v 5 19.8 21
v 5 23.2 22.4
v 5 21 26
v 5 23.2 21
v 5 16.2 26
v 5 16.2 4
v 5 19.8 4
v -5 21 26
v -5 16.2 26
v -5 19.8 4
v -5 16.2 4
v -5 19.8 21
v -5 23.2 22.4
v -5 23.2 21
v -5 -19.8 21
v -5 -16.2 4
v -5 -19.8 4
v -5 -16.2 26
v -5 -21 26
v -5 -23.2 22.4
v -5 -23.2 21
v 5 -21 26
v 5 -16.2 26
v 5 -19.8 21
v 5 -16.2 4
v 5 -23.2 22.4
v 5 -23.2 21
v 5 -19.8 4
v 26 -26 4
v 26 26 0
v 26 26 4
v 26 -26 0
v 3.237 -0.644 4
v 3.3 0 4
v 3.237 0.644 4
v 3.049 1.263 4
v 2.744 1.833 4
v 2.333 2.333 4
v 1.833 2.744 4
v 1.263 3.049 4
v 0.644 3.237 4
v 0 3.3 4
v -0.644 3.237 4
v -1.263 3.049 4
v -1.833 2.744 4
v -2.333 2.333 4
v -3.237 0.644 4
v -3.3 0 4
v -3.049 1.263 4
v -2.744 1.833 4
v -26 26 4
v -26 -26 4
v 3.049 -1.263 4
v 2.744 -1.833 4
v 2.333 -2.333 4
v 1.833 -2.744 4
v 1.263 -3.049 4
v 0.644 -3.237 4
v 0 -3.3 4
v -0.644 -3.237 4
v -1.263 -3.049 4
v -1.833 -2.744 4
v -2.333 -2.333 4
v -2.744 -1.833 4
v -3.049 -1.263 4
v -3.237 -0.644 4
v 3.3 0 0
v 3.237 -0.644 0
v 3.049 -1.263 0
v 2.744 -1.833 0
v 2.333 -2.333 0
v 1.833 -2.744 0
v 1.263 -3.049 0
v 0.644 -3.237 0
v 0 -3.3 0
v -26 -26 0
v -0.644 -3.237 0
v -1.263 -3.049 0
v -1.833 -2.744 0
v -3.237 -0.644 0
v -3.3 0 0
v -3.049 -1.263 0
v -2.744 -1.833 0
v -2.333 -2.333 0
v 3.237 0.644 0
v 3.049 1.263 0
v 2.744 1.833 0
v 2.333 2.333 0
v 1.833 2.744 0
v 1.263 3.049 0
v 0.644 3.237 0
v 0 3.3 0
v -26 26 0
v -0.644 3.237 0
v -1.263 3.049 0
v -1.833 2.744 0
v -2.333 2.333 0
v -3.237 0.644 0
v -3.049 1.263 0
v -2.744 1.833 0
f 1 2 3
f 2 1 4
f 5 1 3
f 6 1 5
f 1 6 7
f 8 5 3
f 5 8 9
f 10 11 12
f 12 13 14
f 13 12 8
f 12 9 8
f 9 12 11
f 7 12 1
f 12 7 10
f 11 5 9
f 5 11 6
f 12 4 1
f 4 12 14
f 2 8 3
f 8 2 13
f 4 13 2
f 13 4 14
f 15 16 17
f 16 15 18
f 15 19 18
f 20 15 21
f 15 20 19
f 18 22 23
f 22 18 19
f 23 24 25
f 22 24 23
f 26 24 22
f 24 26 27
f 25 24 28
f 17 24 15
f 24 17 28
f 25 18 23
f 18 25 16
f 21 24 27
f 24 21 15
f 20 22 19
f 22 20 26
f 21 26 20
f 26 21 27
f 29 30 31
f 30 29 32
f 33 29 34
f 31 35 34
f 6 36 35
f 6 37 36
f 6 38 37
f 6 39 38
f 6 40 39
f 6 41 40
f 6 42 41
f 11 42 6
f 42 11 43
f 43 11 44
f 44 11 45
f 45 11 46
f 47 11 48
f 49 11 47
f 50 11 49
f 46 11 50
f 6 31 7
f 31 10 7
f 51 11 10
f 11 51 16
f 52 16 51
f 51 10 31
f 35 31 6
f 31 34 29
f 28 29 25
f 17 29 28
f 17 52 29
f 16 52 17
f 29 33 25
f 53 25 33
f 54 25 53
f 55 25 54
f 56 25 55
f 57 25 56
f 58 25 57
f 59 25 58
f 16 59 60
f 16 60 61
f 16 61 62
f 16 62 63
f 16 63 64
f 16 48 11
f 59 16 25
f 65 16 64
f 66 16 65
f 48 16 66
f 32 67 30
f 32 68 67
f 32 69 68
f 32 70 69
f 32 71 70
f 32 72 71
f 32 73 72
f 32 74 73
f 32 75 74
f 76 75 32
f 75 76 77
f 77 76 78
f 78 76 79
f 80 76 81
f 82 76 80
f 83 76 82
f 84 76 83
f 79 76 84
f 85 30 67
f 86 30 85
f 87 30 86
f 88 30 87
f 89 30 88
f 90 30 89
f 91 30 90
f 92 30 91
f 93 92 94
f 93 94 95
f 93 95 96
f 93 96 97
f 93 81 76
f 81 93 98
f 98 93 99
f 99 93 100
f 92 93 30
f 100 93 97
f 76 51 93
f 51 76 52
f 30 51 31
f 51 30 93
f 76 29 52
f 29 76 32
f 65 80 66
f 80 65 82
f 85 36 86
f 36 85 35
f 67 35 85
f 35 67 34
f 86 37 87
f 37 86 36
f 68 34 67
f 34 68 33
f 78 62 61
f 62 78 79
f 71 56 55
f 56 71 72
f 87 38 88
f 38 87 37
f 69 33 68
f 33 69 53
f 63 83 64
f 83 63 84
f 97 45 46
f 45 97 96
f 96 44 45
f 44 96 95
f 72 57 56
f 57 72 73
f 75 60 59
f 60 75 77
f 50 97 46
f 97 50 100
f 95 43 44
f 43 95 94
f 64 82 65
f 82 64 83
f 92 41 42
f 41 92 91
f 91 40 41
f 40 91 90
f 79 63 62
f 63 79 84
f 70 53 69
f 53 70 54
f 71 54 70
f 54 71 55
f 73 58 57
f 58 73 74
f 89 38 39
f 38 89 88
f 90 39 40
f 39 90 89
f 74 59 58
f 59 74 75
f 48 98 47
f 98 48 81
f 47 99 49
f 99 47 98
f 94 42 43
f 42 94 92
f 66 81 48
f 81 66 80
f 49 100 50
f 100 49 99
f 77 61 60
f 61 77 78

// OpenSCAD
$fn = 32;

// ----------------------------------------------------------------------
// Snap-fit latch: 2 arms, 22 mm tall, 3.6 mm undercut hooks
// ----------------------------------------------------------------------

// --- parameters (mm) ---
base_d = 52;              // base plate depth
base_h = 4;               // base plate thickness
span = 36;                // distance between opposite arms
arm_t = 3.6;              // arm thickness
arm_d = 10;               // arm width
height = 22;              // free arm length
head_len = 3.6;           // hook reach
head_h = 5;               // hook height
lead = 1.4;               // lead-in ramp thickness
bore_d = 6.6;             // base fixing bore
top_z = 26;               // height of the arm tips above the base

arms = 2;

difference() {
  union() {
    /* base plate, centred on the arm ring */
    translate([-26, -26, 0]) cube([base_d, base_d, base_h]);
    for (a = [0 : 360 / arms : 359]) rotate([0, 0, a]) {
    /* arm, sunk 0.5 mm into the base */
    translate([-arm_d / 2, span / 2 - arm_t / 2, base_h - 0.5]) cube([arm_d, arm_t, height + 0.5]);
    /* hook: a convex hull of a tall inner block and a thin outer lip
       gives a flat undercut below and a lead-in ramp on top */
    hull() {
      translate([-arm_d / 2, span / 2 + arm_t / 2 - 0.6, top_z - head_h]) cube([arm_d, lead + 0.4, head_h]);
      translate([-arm_d / 2, span / 2 + arm_t / 2 - 0.2, top_z - head_h]) cube([arm_d, head_len, lead]);
    }
    }
  }
  translate([0, 0, -2.5]) cylinder(h = base_h + 5, d = bore_d);
}
